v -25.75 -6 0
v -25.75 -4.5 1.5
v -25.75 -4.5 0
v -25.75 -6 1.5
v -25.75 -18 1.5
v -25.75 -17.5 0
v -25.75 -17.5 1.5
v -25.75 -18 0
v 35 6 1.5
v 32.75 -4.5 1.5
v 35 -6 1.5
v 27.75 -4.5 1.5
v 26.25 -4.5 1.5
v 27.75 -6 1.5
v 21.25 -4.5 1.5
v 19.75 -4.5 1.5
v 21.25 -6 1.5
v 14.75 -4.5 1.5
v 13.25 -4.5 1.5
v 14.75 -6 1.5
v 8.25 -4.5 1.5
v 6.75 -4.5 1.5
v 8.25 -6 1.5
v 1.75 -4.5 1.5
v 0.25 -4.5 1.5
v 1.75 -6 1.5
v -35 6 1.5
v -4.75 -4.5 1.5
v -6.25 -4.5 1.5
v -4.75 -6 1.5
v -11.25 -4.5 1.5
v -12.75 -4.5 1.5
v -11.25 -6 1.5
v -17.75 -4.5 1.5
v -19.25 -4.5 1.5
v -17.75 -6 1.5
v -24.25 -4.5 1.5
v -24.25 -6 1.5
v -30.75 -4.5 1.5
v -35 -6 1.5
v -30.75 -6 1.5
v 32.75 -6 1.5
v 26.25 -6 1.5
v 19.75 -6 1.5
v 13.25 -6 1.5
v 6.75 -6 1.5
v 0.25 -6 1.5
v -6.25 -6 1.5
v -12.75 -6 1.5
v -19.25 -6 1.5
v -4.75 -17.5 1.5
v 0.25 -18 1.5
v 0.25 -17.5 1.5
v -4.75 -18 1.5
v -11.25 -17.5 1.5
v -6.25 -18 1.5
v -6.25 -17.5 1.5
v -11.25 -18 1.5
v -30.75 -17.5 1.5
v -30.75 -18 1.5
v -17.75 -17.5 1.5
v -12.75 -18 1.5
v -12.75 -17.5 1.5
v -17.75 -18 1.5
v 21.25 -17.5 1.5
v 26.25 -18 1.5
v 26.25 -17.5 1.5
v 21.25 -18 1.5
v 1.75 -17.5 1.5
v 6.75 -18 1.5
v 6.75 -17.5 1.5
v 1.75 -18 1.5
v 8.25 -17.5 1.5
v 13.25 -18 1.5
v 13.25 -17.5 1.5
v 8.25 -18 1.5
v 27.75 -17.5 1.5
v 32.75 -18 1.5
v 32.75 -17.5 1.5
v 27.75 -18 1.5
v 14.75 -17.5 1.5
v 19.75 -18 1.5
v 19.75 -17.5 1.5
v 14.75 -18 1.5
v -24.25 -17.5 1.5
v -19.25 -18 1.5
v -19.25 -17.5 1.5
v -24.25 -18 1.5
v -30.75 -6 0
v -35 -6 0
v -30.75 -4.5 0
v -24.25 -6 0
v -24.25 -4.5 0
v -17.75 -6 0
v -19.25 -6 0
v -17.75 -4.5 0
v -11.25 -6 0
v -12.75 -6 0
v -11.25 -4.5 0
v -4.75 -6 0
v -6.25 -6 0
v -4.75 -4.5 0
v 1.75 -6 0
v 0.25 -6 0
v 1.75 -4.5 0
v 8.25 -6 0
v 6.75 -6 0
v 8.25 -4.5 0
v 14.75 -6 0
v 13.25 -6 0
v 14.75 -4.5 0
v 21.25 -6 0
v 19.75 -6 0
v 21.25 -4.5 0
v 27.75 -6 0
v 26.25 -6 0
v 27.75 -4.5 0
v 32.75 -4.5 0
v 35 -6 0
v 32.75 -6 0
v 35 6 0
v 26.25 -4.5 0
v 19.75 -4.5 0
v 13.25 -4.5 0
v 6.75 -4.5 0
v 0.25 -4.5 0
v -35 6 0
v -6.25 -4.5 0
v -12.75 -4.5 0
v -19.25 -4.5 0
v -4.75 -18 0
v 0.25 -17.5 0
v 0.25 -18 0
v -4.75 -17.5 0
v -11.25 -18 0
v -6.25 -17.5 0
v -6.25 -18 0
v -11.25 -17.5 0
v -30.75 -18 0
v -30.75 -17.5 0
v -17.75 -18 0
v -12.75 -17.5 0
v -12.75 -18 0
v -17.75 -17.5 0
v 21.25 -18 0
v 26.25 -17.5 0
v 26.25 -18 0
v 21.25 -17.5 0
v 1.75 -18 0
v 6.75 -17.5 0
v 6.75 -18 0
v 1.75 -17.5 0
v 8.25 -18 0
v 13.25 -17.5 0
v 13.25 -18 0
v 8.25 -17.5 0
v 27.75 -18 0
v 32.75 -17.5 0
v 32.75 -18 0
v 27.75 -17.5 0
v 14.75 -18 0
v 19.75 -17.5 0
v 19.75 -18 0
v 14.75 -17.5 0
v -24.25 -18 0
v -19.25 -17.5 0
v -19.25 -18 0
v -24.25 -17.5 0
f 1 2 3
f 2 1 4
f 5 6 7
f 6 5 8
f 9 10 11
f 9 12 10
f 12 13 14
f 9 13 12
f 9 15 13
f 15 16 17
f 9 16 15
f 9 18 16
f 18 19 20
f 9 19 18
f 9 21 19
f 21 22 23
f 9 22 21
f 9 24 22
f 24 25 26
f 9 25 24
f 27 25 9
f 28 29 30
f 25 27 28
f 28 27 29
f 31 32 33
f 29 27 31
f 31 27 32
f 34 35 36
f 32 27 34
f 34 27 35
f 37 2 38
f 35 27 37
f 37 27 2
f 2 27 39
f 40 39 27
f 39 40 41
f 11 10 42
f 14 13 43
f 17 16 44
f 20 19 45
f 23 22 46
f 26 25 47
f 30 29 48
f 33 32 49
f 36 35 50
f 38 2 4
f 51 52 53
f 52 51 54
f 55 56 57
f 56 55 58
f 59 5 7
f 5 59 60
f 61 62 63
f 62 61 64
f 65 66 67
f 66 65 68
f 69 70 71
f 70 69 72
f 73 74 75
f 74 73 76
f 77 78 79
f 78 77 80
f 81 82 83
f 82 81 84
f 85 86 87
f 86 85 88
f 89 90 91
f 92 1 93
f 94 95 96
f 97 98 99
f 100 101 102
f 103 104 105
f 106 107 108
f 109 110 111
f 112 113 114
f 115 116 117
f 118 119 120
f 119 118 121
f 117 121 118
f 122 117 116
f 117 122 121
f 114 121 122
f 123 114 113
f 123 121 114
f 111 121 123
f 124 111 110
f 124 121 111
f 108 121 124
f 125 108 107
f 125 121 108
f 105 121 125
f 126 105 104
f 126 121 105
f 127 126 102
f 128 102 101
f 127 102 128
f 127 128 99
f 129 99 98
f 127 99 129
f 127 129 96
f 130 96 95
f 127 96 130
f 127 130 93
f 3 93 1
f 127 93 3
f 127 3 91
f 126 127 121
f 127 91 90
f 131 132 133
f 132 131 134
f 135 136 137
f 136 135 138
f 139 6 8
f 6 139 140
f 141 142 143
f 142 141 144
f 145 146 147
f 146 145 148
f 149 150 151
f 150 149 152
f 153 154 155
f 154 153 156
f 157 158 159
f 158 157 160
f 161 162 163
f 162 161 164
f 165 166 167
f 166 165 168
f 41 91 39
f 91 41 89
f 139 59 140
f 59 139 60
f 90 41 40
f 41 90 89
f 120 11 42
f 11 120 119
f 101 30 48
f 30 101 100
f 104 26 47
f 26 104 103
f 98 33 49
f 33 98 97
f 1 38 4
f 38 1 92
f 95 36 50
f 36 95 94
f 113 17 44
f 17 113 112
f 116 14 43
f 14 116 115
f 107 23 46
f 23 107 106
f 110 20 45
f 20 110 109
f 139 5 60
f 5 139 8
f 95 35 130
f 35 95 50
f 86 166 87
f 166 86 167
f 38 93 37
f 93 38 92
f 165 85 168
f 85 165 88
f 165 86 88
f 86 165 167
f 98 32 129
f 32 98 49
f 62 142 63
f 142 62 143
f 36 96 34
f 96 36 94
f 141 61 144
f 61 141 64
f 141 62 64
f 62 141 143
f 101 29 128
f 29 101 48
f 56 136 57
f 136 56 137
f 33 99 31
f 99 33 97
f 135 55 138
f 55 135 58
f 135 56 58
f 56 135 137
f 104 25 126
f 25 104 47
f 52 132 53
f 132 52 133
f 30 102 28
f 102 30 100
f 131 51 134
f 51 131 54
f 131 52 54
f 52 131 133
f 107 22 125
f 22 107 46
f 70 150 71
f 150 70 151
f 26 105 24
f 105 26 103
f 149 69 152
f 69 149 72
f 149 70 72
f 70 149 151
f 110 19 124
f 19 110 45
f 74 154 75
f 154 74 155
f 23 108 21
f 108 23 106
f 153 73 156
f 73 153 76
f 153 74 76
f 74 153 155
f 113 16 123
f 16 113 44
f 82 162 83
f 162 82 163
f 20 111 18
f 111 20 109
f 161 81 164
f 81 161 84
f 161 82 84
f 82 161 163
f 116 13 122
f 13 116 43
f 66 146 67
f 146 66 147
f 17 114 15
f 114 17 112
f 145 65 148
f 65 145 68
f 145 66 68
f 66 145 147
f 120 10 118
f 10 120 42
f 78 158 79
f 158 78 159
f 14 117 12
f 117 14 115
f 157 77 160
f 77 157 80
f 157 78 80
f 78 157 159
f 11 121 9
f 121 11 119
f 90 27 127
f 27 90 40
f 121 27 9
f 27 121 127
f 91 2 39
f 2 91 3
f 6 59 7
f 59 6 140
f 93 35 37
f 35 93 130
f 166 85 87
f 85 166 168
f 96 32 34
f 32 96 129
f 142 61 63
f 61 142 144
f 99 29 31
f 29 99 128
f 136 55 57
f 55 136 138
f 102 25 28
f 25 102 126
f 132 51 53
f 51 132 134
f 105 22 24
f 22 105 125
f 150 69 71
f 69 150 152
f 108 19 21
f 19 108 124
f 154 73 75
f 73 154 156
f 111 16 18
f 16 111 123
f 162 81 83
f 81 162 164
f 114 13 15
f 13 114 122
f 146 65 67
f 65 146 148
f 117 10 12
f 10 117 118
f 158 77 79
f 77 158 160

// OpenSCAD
// 10-well comb for casting agarose gels, printed lying flat
// Units: mm

// ---- Spine ----
spine_len   = 70;   // spine length along X
spine_wid   = 12;   // spine width along Y
spine_thk   = 1.5;  // spine thickness along Z

// ---- Teeth ----
tooth_count = 10;   // number of teeth
tooth_wid   = 5.0;  // tooth width along X
tooth_len   = 12;   // tooth length along Y (overlaps spine)
gap         = 1.5;  // gap between neighbouring teeth

// ---- Misc ----
eps         = 0.5;  // cutter overshoot past faces
$fn         = 64;

// Derived
pitch       = tooth_wid + gap;                 // centre-to-centre spacing
row_span    = (tooth_count - 1) * gap;         // distance from first to last tooth edge
x_start     = -spine_len / 2 + row_span / 2;   // first tooth left edge (row centred)

difference() {
    // Plate: spine + teeth, all in the same flat layer
    union() {
        translate([-spine_len / 2, -spine_wid / 2, 0])
            cube([spine_len, spine_wid, spine_thk]);
        for (i = [0 : tooth_count - 1])
            translate([x_start + i * pitch - tooth_wid / 2,
                       -spine_wid / 2 - tooth_len,
                       0])
                cube([tooth_wid, tooth_len, spine_thk]);
    }

    // Cut out the wells (through the plate, past both faces)
    for (i = [0 : tooth_count - 1])
        translate([x_start + i * pitch - tooth_wid / 2,
                   -spine_wid / 2 - tooth_len + eps,
                   -eps])
            cube([tooth_wid, tooth_len + 2 * eps, spine_thk + 2 * eps]);
}
